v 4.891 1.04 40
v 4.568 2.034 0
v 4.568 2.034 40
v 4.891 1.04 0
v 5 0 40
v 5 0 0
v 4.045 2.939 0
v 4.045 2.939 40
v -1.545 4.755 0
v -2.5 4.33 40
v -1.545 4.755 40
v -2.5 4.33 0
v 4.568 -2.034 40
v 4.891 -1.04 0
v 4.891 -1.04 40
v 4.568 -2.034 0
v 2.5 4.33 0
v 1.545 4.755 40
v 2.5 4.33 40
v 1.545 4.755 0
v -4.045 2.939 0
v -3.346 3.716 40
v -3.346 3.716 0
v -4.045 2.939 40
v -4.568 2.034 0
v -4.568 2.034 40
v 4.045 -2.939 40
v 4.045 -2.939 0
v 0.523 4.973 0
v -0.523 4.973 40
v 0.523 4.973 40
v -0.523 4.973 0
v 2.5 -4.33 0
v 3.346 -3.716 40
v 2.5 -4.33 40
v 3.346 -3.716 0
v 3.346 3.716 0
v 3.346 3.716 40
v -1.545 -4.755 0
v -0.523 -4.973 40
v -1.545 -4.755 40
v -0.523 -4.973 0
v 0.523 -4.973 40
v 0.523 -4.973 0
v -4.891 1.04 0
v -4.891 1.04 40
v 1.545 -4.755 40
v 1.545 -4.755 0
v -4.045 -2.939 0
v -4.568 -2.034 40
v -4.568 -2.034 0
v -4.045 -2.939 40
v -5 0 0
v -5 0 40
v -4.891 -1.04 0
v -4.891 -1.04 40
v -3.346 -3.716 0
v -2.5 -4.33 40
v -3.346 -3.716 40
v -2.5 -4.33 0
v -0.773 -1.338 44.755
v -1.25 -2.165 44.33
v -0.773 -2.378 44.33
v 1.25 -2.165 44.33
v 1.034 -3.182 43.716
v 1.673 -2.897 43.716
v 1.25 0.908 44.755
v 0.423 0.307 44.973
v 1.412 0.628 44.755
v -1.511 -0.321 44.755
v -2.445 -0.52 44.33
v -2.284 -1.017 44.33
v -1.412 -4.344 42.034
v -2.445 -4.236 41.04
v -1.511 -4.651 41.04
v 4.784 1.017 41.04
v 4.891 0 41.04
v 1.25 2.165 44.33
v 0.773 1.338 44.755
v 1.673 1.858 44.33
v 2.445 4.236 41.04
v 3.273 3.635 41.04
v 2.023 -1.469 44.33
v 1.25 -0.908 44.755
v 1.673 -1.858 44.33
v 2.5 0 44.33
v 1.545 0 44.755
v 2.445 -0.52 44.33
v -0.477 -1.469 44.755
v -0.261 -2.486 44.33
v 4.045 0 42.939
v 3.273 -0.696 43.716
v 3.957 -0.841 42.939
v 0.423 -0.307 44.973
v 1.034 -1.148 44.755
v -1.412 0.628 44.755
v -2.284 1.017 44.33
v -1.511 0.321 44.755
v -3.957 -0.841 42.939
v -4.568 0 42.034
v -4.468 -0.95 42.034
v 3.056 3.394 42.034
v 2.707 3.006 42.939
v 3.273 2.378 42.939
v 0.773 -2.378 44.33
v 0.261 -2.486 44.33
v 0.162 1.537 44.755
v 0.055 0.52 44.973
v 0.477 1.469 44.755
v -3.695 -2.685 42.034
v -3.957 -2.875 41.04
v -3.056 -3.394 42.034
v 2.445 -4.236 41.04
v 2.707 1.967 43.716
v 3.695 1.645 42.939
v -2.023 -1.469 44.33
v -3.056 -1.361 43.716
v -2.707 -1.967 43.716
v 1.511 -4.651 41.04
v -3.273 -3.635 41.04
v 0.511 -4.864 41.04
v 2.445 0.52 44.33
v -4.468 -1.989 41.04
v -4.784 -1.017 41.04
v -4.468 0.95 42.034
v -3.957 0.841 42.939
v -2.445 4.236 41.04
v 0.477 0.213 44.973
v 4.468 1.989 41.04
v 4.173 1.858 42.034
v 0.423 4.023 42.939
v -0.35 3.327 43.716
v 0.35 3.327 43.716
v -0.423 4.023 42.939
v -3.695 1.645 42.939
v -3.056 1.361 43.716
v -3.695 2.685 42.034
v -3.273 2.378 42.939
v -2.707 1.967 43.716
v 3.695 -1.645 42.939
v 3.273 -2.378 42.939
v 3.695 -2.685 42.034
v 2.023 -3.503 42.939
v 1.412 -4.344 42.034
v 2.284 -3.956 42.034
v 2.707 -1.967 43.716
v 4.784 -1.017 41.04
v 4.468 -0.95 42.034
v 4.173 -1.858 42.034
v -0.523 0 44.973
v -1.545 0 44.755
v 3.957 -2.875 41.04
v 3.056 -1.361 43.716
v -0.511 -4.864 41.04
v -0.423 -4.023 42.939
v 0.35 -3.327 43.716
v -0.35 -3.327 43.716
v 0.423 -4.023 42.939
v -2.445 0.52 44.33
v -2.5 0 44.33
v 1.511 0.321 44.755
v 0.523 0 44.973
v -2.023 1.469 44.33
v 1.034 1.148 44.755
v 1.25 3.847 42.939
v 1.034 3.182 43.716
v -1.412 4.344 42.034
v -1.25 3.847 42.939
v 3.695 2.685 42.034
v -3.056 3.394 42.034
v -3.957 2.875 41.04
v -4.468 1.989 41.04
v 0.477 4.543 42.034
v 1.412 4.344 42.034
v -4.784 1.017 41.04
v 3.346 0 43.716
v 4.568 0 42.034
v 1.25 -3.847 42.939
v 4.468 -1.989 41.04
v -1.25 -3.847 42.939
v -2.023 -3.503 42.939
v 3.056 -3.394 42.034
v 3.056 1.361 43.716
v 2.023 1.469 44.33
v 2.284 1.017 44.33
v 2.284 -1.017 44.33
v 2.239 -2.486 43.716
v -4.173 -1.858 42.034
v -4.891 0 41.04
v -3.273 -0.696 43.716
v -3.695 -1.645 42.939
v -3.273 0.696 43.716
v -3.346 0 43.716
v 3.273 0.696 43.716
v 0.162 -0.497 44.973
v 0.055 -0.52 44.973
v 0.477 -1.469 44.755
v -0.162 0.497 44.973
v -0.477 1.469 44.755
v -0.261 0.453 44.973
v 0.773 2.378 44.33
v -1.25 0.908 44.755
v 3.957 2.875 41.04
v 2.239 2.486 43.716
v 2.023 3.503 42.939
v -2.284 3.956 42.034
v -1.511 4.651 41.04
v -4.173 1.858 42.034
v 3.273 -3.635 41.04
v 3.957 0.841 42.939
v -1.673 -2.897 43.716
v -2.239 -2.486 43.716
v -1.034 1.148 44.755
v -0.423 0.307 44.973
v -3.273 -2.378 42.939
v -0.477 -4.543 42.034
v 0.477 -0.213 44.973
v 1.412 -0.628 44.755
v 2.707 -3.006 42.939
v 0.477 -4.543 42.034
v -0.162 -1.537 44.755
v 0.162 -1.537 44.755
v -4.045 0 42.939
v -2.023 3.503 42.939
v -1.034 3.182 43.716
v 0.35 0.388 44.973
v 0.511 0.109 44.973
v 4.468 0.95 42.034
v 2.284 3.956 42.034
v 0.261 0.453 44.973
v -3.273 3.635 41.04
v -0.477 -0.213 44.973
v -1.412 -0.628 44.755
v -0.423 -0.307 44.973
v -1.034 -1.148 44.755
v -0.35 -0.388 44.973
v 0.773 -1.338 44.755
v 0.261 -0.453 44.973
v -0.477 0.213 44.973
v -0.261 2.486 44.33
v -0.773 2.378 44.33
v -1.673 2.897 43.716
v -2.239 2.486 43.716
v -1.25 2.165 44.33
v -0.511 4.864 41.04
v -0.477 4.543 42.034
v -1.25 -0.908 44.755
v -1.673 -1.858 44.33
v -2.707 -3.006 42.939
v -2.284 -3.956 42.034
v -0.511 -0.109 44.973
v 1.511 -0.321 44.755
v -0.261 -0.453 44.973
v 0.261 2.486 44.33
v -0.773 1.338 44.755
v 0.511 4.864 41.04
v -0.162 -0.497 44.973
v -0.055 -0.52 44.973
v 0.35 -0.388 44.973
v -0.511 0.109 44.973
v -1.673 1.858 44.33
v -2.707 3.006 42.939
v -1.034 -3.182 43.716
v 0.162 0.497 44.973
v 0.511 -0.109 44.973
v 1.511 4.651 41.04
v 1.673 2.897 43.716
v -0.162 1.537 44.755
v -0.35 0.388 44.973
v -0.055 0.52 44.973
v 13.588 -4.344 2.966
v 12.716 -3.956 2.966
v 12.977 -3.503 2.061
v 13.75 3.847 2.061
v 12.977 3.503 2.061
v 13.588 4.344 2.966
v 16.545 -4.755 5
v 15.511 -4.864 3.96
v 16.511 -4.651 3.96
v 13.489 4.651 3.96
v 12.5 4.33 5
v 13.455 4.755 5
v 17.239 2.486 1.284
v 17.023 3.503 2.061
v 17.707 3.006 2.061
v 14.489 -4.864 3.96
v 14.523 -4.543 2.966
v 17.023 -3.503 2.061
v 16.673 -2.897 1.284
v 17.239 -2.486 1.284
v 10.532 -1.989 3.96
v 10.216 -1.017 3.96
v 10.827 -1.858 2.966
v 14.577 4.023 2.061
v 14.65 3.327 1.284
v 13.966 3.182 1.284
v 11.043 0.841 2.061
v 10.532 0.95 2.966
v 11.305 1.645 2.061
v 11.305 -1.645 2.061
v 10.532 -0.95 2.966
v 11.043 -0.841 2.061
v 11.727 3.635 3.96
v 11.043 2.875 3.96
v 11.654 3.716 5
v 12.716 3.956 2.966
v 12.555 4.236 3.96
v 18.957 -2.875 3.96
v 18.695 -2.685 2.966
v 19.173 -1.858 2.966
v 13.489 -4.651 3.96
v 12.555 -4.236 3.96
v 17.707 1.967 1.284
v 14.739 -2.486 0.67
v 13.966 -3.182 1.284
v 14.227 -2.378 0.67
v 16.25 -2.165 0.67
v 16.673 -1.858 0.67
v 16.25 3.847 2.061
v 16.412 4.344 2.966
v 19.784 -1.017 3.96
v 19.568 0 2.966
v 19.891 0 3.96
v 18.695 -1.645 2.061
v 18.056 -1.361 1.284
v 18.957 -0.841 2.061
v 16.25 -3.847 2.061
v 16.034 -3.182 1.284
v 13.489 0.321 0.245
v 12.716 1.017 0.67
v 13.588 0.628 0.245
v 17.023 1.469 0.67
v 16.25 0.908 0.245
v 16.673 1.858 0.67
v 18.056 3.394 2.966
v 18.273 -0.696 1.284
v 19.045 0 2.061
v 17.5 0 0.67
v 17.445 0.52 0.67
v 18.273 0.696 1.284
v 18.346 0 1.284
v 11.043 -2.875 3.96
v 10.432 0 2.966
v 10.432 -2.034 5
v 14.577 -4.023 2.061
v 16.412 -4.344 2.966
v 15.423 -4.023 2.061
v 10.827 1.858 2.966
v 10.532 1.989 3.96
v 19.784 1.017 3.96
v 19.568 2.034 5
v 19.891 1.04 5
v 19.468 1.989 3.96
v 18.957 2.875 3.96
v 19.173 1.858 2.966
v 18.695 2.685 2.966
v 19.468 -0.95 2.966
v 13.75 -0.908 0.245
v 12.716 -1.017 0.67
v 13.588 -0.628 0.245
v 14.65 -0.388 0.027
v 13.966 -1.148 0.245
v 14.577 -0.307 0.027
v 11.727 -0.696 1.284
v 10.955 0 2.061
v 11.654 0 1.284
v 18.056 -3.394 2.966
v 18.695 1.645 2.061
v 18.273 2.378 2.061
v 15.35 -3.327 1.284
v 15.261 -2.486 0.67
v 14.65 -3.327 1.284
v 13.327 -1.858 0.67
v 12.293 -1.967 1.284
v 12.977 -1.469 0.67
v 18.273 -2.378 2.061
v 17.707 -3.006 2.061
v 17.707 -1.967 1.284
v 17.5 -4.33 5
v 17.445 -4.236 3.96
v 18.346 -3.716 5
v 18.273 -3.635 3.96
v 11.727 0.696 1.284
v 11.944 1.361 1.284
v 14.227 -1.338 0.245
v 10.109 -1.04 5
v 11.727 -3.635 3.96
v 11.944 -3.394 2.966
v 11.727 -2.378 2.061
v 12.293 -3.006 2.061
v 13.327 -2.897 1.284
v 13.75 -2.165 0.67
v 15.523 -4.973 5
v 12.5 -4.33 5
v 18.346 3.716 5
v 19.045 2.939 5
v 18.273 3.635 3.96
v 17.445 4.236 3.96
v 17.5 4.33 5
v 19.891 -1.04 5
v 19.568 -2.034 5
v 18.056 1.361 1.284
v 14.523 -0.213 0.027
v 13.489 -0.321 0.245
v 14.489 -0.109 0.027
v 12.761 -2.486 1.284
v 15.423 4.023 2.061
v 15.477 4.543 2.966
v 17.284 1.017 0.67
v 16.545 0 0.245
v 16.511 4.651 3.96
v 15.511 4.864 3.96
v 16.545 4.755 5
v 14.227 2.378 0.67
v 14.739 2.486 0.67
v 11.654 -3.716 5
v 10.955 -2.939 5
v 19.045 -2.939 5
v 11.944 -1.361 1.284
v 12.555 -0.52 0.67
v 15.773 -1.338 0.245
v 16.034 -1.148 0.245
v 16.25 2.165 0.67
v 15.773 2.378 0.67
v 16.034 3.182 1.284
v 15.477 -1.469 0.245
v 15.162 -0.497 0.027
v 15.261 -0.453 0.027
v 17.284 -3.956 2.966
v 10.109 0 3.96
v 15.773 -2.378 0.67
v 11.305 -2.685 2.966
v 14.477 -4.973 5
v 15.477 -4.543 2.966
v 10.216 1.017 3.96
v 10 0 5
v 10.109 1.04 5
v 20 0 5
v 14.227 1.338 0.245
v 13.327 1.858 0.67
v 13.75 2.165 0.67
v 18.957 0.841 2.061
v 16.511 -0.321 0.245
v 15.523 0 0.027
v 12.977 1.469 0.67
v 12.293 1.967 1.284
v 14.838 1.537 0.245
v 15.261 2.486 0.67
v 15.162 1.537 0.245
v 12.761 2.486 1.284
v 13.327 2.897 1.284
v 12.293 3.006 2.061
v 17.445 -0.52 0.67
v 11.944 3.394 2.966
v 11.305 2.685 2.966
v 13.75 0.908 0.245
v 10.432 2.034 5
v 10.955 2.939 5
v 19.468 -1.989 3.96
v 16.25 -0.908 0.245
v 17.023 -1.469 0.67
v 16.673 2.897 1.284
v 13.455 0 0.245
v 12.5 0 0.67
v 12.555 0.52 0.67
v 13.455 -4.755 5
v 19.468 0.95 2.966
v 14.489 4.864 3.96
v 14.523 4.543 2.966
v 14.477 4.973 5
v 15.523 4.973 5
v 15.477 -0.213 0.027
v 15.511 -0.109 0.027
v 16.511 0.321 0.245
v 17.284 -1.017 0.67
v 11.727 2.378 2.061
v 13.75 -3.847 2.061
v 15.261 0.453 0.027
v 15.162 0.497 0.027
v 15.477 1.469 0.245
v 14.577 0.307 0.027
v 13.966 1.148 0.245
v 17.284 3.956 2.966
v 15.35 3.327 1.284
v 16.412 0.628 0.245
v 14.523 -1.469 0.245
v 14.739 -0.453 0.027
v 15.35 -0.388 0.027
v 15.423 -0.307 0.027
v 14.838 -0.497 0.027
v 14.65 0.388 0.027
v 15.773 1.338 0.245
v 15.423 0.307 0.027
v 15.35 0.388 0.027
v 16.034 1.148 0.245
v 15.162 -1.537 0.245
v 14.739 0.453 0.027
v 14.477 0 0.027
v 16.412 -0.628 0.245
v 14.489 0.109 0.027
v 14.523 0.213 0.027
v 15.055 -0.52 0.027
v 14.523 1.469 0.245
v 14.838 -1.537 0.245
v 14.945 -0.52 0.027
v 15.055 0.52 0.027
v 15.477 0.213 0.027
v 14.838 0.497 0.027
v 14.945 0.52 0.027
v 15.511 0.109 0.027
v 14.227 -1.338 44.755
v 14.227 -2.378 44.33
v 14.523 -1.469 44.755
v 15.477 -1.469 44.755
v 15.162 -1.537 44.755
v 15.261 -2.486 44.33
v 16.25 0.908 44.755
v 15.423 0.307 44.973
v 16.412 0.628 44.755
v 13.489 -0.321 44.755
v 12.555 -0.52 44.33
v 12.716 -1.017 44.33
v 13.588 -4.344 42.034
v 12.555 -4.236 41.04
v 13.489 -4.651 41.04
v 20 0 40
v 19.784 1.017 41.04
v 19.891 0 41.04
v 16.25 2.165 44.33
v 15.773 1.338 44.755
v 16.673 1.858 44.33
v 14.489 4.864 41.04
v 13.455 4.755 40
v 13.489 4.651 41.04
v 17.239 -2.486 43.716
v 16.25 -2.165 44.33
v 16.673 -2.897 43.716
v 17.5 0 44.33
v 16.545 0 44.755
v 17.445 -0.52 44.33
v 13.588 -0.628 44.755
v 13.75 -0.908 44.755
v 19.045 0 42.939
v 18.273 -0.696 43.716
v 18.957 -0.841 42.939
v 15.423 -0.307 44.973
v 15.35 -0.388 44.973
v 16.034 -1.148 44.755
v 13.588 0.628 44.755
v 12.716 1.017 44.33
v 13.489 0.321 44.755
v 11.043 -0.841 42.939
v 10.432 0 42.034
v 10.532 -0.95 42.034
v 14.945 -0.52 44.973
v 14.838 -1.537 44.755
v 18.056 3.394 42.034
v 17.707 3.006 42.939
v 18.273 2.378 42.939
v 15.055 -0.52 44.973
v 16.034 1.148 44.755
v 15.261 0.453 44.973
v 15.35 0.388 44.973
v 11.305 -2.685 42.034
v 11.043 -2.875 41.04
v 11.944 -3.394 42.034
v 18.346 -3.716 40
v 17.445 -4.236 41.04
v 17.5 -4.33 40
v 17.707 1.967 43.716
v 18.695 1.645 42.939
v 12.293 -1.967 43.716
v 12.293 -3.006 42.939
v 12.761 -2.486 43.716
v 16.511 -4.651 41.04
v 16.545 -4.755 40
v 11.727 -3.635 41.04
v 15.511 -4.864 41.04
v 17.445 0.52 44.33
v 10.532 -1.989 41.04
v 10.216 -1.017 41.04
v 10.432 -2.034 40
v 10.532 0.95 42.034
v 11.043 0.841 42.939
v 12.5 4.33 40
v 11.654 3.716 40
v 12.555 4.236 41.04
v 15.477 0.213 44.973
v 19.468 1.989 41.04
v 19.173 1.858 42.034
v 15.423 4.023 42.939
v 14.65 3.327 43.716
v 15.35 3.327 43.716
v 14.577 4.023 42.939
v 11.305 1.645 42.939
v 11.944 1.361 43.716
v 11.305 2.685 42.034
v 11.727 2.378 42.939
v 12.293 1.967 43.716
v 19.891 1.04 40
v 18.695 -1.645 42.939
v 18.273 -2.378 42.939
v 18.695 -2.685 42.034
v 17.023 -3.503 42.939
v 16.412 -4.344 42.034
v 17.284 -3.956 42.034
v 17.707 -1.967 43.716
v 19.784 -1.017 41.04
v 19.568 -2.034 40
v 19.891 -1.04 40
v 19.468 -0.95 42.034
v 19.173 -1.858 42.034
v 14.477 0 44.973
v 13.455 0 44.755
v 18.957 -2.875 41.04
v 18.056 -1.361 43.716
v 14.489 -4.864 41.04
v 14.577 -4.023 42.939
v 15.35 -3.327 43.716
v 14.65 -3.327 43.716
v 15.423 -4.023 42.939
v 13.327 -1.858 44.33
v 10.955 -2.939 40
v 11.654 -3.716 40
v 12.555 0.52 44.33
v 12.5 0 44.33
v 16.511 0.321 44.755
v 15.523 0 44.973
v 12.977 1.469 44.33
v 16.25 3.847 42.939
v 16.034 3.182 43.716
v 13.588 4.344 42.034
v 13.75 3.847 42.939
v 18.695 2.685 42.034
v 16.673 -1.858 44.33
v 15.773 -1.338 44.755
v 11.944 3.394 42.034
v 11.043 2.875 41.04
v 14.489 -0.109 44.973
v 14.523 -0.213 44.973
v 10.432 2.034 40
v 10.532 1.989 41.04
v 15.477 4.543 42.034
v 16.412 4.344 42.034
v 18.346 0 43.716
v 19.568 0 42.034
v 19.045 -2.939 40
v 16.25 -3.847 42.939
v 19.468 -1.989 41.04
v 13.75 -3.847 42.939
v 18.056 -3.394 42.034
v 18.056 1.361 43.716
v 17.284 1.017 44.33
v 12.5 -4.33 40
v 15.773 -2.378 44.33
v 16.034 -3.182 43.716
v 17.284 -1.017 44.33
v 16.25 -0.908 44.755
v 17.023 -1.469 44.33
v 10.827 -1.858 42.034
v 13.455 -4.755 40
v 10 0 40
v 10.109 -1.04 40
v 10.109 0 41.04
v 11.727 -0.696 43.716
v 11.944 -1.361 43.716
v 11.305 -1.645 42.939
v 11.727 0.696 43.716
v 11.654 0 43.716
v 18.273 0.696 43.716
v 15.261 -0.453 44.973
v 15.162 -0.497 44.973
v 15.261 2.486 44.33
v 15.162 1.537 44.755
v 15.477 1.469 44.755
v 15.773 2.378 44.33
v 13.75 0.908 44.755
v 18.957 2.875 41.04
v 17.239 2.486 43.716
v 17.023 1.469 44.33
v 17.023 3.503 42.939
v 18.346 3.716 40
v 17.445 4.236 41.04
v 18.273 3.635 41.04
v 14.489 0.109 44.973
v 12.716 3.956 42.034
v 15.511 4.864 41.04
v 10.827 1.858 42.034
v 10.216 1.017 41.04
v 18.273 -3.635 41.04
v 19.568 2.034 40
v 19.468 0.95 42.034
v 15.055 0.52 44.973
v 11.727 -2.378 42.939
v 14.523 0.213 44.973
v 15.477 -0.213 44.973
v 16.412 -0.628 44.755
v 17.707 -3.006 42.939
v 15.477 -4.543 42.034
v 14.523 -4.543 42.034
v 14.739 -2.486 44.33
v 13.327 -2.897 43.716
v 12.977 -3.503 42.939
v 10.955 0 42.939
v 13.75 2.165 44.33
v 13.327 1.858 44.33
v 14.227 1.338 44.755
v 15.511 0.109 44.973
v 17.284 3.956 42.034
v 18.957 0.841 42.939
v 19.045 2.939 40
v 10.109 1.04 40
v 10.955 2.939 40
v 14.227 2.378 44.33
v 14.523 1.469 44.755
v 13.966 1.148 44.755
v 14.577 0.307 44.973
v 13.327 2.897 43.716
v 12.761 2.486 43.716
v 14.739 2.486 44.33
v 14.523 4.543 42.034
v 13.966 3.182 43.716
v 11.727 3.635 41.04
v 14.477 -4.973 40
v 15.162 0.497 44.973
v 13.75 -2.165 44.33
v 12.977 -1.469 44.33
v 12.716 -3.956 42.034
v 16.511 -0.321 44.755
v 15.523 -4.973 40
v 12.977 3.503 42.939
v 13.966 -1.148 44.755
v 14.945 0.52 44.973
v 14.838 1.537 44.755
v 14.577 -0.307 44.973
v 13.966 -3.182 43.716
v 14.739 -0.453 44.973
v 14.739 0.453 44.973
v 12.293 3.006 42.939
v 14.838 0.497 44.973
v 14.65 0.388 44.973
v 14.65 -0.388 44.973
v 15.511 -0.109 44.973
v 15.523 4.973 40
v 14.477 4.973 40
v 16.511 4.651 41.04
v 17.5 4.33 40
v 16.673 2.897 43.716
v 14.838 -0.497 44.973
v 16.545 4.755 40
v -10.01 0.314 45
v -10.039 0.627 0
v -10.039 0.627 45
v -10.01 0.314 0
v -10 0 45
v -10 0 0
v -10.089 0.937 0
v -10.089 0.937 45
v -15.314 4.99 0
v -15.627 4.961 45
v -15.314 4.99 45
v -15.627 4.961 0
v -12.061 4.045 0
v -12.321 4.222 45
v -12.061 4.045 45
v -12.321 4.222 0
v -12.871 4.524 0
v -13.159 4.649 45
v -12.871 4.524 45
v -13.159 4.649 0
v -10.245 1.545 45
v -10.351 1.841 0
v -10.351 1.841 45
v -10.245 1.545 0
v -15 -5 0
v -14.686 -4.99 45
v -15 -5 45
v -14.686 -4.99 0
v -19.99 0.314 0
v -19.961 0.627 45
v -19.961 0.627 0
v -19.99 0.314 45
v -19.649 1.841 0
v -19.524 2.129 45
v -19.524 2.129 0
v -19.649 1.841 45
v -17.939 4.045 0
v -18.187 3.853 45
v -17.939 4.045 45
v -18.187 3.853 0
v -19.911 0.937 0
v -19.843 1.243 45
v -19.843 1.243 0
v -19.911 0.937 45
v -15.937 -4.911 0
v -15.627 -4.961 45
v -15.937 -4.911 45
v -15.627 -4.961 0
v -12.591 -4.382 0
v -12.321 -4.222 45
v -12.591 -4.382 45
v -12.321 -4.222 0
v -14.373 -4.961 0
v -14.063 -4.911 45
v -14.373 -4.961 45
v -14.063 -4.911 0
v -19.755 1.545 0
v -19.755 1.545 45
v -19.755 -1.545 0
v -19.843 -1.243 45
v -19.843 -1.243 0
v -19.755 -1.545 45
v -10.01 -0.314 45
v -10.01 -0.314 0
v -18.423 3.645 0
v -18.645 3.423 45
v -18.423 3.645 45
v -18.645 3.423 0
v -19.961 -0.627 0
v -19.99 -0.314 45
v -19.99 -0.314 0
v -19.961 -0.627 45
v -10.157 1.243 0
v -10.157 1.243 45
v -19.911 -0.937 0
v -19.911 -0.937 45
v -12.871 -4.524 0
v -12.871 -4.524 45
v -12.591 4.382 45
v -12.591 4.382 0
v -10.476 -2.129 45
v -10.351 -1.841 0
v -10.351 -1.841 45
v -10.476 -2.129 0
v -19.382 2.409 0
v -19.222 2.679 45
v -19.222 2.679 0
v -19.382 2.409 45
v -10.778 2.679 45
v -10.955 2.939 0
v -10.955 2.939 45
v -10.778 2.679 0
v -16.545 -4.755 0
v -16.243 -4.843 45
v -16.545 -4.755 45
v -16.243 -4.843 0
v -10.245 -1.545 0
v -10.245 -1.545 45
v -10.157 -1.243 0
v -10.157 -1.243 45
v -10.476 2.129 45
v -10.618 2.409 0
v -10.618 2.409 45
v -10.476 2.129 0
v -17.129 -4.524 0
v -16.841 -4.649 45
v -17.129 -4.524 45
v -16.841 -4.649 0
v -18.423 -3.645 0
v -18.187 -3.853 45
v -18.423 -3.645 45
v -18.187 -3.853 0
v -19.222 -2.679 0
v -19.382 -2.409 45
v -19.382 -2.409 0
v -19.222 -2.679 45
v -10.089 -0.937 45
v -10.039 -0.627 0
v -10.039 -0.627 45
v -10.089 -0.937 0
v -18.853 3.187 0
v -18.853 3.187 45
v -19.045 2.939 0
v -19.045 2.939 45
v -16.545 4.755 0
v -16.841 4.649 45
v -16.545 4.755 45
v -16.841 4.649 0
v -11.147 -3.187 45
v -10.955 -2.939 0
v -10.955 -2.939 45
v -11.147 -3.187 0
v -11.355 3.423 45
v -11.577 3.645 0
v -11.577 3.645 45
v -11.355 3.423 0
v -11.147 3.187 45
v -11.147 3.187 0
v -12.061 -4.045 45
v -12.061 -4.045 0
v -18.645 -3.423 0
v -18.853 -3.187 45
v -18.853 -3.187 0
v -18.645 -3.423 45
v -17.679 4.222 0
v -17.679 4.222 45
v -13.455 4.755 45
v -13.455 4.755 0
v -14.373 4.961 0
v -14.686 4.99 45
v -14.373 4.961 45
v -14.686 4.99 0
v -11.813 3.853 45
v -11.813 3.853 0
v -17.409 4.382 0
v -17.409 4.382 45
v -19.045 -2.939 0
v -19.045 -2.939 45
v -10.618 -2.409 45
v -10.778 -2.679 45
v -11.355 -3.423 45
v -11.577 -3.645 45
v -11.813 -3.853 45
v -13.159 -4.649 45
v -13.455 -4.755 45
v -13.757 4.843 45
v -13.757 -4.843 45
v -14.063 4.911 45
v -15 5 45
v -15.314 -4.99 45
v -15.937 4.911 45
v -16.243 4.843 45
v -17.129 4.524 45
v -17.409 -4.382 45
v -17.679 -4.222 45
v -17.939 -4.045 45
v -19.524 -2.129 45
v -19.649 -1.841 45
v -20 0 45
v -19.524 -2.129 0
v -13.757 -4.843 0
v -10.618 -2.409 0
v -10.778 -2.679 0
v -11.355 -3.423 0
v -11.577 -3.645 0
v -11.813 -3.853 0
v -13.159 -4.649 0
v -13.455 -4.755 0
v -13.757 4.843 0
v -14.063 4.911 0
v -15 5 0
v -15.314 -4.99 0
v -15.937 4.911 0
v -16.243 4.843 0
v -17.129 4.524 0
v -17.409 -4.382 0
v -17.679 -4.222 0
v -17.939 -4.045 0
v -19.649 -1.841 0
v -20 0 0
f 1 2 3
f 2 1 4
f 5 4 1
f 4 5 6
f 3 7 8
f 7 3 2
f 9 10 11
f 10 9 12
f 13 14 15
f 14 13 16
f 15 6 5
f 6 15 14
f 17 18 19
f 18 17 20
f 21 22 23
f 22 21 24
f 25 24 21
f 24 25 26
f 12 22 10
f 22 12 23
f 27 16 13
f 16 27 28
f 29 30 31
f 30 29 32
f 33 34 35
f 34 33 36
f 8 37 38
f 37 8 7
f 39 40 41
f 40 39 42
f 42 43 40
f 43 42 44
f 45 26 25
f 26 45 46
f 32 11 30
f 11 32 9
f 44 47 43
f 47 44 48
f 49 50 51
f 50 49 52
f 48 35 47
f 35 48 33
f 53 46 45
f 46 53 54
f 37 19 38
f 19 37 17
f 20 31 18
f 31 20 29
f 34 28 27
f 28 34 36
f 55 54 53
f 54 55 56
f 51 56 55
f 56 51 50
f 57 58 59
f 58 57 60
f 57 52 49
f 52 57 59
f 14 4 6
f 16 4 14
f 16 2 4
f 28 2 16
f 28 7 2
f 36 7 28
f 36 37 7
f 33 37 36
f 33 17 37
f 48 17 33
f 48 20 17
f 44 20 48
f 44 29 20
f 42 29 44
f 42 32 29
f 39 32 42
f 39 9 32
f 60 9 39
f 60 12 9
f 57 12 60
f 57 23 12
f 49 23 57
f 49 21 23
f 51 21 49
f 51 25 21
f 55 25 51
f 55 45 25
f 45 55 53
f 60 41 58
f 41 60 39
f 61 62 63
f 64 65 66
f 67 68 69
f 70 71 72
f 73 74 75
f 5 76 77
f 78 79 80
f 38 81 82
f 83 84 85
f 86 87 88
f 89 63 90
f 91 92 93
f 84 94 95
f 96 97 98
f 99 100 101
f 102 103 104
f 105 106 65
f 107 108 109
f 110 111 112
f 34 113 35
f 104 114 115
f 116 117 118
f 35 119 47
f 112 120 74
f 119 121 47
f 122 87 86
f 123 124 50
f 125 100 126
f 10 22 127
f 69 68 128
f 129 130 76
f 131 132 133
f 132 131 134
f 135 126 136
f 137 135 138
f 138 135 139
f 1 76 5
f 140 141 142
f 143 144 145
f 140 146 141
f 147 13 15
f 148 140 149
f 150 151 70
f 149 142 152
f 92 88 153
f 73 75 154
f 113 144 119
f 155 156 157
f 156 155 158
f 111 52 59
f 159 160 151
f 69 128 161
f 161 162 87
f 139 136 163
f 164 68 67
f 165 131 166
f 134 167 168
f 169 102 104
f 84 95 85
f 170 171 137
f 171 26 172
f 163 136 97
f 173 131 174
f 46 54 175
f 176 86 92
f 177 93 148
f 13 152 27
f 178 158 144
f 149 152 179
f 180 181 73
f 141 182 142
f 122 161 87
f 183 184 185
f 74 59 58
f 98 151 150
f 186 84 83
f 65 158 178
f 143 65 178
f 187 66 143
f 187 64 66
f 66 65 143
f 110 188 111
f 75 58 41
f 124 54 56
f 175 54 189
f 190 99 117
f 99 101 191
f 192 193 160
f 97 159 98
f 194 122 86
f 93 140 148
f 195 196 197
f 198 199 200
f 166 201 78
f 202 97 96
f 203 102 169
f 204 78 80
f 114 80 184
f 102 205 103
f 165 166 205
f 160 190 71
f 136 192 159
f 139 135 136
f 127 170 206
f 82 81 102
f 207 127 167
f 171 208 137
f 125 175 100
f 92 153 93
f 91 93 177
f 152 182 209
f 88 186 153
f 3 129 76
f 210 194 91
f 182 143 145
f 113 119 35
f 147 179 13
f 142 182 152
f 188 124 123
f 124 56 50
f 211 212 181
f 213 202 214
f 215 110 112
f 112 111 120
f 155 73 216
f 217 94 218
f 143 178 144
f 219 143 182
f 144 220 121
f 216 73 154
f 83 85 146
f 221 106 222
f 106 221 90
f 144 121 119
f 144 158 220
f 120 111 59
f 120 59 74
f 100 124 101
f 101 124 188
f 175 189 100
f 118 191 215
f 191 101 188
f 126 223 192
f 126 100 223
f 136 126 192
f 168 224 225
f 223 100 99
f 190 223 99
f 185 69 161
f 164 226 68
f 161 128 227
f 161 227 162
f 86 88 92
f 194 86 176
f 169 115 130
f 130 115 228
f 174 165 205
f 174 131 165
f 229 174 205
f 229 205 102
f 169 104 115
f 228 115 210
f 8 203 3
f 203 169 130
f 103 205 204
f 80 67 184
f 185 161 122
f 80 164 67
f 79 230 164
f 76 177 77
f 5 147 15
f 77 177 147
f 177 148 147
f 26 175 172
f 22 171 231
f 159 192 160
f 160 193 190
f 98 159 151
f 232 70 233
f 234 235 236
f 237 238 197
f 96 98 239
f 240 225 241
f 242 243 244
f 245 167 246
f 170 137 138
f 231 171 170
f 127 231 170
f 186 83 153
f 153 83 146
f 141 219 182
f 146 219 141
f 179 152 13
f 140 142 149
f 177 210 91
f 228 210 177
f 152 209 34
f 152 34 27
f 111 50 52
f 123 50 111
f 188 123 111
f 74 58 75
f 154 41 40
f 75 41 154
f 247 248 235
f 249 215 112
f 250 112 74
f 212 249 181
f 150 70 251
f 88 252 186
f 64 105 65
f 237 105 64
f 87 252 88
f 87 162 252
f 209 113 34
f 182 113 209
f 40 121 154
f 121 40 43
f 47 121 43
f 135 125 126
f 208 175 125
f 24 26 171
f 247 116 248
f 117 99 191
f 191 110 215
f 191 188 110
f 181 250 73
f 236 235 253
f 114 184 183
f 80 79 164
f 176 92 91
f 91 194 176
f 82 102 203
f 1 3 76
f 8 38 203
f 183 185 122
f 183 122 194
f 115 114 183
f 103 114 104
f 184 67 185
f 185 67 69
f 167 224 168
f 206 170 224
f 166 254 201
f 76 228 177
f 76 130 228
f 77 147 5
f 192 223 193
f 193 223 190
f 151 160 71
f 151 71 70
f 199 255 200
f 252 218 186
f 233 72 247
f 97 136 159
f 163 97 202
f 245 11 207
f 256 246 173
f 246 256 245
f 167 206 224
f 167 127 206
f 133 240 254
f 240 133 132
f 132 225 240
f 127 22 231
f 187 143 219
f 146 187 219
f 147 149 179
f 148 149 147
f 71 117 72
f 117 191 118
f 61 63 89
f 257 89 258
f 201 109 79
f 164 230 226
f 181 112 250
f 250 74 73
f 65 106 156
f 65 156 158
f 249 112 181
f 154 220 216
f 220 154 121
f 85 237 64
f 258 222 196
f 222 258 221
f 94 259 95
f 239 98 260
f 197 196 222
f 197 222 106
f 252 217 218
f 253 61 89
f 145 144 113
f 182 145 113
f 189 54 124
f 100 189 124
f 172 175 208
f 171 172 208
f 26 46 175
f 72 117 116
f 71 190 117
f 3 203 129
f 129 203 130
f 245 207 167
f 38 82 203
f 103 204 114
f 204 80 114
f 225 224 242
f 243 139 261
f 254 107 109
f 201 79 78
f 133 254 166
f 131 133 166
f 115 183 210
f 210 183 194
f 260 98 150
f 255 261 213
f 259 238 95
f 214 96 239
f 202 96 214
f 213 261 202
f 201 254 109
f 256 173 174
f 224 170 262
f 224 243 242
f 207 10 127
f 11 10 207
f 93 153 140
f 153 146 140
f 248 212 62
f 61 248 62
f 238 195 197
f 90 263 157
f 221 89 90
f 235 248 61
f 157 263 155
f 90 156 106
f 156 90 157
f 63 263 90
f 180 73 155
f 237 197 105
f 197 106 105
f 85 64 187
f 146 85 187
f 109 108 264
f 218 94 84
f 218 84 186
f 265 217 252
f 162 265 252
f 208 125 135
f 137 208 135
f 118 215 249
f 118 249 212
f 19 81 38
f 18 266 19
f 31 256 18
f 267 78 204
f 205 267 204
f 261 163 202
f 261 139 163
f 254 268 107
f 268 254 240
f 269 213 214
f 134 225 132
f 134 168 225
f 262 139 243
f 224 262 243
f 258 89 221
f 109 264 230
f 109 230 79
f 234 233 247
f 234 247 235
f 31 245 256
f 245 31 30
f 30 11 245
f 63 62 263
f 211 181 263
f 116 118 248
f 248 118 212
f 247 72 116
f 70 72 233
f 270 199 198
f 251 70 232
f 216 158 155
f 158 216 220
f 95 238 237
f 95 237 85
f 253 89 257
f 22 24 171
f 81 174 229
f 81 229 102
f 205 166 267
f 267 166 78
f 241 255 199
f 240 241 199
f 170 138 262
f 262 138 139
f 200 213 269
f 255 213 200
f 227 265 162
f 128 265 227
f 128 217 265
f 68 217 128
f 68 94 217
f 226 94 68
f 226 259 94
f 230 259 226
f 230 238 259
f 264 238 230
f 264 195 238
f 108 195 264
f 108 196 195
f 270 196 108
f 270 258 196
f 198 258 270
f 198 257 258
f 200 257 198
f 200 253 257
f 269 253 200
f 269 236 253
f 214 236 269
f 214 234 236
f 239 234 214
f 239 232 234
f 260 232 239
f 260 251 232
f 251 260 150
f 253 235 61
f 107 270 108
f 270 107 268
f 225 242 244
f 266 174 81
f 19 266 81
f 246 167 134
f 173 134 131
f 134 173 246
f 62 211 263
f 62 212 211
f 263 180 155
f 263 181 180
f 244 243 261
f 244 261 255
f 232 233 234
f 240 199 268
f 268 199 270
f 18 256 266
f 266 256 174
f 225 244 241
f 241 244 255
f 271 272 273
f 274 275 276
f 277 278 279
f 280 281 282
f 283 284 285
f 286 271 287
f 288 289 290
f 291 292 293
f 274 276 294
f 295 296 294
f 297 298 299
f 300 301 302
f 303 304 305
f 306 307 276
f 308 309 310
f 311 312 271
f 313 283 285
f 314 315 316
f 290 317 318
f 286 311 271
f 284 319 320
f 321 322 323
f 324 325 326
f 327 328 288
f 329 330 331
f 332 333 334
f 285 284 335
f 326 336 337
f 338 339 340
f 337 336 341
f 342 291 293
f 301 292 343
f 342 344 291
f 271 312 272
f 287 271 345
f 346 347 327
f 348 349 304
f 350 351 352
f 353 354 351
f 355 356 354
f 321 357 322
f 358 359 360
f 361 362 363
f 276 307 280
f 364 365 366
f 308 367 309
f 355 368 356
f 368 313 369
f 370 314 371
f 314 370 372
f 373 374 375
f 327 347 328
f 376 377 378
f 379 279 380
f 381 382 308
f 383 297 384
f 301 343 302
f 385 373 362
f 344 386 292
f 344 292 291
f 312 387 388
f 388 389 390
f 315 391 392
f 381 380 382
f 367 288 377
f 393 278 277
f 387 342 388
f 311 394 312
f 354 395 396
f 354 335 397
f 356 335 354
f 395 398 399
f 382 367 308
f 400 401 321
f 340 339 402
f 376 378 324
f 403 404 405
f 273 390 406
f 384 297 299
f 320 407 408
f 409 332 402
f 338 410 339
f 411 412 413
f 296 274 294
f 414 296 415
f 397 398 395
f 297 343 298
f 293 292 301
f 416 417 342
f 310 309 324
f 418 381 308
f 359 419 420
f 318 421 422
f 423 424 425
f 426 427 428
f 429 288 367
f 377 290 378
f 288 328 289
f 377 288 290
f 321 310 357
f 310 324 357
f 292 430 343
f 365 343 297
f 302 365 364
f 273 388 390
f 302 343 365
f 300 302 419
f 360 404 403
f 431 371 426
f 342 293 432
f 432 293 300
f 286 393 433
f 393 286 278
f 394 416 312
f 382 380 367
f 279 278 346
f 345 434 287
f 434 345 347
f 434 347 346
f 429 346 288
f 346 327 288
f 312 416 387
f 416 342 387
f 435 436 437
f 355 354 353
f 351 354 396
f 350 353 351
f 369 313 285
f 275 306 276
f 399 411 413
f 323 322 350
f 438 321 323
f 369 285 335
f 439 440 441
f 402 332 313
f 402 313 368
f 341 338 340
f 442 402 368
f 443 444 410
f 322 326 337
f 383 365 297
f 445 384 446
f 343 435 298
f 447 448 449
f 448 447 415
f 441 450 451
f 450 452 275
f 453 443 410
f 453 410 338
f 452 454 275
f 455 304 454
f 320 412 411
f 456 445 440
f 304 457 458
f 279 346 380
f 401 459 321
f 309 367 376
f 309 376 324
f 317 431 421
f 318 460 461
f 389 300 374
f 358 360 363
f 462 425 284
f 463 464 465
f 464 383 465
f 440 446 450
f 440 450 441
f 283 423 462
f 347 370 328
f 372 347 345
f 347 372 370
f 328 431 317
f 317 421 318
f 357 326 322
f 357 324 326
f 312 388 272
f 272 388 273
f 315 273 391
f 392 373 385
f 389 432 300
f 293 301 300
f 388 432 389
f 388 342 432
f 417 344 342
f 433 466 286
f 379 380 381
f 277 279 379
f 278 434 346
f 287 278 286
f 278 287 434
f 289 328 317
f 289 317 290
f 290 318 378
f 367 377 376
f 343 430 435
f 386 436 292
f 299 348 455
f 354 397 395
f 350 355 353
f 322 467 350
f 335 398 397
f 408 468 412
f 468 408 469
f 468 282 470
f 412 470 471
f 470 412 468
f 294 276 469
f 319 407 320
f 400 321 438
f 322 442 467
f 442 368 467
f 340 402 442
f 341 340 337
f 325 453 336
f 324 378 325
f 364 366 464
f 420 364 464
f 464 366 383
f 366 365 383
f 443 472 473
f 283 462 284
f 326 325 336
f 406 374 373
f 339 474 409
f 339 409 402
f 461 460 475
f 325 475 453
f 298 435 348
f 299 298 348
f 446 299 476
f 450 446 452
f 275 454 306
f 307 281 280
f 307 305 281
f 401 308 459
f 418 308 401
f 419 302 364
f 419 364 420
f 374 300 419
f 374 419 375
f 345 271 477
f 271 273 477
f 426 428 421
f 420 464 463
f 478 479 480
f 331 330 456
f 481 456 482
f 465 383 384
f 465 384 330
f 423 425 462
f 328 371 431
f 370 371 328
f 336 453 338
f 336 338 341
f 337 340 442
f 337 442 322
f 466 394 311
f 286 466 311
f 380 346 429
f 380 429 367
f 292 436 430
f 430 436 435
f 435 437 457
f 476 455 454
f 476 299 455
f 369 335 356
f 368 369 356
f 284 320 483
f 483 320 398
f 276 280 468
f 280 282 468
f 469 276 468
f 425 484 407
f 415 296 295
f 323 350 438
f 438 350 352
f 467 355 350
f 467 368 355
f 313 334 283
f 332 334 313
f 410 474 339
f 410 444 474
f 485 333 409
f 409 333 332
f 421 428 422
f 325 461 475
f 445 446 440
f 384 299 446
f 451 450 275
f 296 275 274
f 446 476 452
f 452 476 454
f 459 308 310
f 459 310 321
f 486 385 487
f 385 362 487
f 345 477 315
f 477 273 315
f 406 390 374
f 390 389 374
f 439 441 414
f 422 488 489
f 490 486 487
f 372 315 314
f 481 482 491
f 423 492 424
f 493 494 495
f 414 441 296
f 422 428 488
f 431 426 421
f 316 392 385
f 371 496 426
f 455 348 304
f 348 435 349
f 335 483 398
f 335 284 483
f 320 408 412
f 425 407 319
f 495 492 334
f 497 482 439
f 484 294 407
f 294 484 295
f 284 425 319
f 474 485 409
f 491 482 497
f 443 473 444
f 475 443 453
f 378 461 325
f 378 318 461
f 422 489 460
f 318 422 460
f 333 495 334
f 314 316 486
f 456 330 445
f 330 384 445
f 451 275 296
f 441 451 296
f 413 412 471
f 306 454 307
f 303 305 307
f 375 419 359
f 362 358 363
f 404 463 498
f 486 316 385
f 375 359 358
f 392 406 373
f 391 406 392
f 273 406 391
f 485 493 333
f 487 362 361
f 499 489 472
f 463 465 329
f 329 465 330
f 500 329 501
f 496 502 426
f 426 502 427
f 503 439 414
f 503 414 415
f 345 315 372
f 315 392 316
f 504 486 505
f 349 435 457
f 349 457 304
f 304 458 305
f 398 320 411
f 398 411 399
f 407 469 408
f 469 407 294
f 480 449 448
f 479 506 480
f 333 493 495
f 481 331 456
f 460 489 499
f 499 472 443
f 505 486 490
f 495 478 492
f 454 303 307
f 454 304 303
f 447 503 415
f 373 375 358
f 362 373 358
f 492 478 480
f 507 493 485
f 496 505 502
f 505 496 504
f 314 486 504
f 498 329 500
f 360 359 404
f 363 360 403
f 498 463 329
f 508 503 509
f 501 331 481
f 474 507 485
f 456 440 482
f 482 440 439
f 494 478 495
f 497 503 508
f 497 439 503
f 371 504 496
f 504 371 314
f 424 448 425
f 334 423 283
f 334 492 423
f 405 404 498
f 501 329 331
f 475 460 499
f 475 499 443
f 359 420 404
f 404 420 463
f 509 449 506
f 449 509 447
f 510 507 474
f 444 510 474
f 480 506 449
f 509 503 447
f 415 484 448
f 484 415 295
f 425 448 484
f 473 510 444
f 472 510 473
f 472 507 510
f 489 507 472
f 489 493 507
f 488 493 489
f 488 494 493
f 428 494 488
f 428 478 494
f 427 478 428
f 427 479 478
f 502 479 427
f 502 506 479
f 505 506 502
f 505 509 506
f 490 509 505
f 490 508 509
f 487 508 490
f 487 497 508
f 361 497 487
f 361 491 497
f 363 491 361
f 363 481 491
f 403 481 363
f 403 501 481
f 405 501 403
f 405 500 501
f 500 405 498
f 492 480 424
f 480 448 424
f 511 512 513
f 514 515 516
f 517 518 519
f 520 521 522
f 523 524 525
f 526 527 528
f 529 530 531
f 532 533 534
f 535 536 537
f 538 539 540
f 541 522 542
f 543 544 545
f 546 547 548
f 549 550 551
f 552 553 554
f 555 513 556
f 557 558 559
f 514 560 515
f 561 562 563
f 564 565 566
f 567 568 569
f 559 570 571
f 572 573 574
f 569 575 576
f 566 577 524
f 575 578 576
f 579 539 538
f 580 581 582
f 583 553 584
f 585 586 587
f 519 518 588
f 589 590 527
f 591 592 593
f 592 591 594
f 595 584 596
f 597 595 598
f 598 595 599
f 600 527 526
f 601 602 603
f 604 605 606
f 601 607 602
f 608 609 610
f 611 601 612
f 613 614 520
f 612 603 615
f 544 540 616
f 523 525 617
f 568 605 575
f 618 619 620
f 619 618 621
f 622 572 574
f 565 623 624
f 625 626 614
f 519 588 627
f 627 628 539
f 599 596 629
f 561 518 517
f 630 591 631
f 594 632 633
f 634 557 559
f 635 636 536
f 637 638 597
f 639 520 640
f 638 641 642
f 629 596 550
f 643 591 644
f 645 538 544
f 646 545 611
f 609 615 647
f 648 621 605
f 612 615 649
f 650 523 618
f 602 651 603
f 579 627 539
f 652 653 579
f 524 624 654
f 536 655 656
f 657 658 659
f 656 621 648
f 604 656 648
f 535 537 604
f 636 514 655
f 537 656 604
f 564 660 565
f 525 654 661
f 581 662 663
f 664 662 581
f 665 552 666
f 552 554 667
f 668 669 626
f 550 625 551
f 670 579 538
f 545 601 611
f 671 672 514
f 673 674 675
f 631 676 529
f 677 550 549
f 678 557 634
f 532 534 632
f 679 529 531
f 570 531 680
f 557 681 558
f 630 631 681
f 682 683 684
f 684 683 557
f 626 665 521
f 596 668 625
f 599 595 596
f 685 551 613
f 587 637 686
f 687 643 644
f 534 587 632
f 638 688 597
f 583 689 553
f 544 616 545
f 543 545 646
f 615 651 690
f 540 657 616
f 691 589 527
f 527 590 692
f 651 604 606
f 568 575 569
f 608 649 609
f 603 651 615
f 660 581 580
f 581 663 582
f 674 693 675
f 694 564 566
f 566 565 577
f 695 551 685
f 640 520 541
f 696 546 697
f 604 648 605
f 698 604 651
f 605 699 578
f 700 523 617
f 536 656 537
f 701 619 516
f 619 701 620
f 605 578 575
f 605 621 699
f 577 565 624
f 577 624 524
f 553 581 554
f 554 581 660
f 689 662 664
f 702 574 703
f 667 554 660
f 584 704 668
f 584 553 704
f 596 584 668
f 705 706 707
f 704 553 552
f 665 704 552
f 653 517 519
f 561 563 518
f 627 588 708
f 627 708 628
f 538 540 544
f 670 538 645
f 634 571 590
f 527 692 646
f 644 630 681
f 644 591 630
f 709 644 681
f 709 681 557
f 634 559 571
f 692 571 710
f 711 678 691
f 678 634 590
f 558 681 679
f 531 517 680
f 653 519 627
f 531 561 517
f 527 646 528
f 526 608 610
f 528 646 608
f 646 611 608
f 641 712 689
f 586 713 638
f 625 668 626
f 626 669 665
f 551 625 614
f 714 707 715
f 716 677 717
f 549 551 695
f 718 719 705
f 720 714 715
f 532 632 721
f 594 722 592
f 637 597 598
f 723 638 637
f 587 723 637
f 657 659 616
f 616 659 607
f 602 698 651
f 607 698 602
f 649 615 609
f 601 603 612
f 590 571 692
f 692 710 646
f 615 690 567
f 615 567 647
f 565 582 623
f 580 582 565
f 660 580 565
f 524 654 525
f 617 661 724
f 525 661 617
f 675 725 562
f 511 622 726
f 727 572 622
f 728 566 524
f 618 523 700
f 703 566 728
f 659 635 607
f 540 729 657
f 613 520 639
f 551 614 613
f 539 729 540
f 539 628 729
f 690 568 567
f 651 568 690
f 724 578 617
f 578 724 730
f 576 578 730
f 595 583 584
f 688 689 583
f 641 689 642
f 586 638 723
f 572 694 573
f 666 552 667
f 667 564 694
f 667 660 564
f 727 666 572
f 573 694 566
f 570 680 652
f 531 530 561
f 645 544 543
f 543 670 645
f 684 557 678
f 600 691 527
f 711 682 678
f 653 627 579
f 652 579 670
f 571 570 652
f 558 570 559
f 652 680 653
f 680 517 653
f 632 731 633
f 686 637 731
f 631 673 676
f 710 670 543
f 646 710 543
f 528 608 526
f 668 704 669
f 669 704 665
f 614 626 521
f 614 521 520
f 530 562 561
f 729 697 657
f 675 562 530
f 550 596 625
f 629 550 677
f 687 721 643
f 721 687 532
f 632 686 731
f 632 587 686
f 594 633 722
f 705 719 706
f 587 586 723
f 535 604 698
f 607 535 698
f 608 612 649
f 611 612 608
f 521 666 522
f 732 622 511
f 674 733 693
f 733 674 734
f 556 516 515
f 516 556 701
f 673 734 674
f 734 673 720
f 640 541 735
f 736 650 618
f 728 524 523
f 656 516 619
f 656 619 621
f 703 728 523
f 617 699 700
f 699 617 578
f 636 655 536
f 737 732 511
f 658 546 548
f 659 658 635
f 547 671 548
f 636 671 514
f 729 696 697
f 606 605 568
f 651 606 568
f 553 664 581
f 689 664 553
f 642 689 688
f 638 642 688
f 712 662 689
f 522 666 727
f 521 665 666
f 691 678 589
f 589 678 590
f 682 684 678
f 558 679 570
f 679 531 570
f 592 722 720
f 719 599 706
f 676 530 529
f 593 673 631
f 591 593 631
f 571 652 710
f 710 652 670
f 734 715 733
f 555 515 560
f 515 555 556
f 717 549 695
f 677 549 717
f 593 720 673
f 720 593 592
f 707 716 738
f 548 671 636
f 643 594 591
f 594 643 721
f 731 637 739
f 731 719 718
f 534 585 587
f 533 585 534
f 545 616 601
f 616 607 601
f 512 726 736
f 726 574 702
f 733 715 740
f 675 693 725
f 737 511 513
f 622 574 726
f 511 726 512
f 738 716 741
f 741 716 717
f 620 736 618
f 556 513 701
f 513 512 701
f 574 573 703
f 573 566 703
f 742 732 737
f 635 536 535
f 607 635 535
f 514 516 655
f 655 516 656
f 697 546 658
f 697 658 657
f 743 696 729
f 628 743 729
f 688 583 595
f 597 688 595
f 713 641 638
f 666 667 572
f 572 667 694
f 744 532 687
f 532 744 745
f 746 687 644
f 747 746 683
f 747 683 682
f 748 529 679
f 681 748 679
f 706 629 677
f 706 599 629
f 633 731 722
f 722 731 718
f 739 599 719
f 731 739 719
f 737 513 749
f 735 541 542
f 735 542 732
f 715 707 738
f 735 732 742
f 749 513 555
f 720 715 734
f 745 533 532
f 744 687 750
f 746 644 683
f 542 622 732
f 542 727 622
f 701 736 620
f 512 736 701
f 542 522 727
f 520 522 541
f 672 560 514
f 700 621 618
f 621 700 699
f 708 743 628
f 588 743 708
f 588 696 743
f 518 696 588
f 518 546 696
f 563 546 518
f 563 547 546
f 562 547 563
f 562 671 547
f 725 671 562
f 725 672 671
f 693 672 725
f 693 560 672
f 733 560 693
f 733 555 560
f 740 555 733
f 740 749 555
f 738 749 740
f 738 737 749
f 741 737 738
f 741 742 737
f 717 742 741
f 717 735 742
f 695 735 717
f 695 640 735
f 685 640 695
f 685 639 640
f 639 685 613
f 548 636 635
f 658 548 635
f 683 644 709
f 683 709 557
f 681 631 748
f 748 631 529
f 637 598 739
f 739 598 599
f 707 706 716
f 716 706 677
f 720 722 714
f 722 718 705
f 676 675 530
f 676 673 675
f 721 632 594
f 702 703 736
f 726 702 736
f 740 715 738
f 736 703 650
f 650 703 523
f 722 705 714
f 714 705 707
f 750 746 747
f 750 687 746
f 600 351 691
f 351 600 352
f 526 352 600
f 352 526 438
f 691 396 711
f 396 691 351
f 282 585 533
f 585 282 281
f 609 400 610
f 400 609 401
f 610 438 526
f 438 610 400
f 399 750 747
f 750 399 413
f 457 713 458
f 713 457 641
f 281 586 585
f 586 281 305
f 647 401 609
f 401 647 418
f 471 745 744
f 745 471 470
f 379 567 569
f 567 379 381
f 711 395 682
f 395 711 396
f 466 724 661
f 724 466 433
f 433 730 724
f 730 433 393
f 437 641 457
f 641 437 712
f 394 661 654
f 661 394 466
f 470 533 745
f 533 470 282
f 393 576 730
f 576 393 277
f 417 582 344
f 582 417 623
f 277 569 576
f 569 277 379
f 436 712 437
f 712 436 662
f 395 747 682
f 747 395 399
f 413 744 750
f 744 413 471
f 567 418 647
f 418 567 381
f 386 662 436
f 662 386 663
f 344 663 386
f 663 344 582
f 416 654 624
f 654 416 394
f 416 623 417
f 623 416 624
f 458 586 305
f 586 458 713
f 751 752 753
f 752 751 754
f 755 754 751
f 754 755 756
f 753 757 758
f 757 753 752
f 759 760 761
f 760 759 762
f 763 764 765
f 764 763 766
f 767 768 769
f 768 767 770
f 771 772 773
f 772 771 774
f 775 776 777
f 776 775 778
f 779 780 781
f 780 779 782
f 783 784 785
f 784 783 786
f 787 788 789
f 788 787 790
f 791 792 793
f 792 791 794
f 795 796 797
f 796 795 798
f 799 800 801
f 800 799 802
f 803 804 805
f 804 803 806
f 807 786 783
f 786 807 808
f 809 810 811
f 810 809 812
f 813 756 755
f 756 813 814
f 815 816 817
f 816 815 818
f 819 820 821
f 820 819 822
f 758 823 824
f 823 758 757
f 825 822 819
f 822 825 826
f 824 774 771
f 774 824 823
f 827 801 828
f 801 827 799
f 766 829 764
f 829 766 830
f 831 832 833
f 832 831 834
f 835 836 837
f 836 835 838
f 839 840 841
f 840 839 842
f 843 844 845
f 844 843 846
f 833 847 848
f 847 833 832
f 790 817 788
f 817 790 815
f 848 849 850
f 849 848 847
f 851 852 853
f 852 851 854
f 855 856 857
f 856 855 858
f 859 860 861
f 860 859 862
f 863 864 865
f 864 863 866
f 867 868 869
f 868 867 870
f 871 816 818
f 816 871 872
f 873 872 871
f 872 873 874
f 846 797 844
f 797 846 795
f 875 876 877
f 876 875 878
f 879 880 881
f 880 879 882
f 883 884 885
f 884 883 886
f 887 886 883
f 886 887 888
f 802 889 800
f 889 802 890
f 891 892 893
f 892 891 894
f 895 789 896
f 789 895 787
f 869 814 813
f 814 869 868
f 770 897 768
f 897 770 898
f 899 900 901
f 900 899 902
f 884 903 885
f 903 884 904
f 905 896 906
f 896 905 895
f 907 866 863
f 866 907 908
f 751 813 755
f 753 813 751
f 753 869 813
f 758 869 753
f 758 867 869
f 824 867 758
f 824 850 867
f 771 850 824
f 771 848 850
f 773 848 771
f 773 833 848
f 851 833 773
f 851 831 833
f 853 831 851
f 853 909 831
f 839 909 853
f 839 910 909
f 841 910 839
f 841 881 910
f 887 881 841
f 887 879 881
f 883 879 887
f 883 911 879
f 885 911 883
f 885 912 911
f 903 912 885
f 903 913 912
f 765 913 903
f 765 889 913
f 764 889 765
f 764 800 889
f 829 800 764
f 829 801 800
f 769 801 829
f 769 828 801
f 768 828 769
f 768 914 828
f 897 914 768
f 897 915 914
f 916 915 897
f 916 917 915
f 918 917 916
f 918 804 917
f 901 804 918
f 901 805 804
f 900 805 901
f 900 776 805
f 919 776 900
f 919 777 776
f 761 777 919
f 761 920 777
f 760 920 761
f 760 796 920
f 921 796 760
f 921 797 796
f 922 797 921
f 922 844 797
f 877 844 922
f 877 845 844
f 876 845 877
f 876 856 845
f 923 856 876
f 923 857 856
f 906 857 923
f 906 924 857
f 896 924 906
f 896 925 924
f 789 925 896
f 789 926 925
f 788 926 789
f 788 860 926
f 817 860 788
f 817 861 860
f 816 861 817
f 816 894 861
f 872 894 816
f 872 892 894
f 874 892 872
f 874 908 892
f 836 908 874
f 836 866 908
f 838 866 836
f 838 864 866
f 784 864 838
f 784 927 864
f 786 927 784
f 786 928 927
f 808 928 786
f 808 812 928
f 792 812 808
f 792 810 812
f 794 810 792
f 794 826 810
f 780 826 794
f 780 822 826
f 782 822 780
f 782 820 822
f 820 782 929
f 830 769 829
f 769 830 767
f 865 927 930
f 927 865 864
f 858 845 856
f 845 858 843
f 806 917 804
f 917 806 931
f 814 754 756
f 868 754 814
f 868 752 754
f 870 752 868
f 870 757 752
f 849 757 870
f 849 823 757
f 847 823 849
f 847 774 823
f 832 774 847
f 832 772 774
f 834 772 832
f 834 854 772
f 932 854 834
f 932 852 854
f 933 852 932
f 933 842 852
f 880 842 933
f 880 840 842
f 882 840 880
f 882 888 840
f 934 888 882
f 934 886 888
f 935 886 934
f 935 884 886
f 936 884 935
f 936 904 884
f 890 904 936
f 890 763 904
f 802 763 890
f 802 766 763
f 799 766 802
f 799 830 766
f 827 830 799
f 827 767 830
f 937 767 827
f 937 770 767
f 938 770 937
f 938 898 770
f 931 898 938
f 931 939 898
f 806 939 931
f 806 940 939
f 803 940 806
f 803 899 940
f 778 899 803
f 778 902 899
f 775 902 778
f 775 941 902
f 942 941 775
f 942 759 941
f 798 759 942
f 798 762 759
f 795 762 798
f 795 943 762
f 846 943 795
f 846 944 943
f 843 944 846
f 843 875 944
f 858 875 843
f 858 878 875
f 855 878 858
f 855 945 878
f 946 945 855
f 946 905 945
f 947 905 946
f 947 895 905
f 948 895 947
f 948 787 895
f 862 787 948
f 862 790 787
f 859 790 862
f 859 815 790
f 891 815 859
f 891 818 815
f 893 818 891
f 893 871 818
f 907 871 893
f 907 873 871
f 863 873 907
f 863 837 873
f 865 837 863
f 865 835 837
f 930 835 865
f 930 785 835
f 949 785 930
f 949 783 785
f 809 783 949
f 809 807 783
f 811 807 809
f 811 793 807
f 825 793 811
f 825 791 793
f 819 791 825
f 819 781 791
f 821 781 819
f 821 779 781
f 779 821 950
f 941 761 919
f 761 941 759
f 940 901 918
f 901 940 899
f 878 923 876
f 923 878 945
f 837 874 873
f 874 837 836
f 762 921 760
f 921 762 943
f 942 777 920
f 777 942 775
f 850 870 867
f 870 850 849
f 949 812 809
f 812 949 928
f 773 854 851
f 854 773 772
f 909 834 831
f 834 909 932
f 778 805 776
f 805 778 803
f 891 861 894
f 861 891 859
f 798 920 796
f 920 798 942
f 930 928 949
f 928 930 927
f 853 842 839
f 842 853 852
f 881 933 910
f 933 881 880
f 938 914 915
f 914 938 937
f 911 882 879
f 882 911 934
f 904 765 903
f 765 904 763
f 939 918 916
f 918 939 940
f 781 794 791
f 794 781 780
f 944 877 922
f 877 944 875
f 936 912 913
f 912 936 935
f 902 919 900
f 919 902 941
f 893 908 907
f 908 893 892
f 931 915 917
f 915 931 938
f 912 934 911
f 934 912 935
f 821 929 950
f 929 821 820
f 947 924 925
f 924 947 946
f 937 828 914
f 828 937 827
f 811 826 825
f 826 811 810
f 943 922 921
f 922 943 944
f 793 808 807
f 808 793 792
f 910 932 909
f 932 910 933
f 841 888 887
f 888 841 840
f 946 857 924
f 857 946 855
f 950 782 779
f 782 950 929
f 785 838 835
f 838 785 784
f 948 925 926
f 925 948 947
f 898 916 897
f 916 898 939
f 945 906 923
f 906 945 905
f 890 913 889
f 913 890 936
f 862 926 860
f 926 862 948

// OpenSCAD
module rcylinder(r=4, h=20,center=false,both=false,$fn=30){
	hc= (both == true) ? h-2*r : h-r;
	posc = (center==true) ? 0 : h/2;

	translate([0,0,posc]){
		if(both == true){
				cylinder(r=r,h=hc,center=true,$fn=$fn);
				for(i=[-1:1])
					translate([0,0, i * hc/2])
						sphere(r=r,$fn = $fn);
			}else{
				translate([0,0,-h/2]){
					cylinder(r=r,h=hc,$fn=$fn);
					translate([0,0,hc])
						sphere(r=r,$fn=$fn);
				}
			}
	}
}

//parametros para los ejemplos

r=5;
h=45;
center=false;
$fn=100;

// ejemplos

//cilindro normal

translate([-3*r,0,0])
	cylinder(r=r,h=h,center=center,$fn=$fn);

//cilindro con tapa superior redondeada

rcylinder(r=r,h=h,both=false,center=center,$fn=$fn);

// cilindro con ambas tapas redondeadas

translate([3*r,0,0])
	rcylinder(r=r,h=h,both=true,center=center,$fn=$fn);
